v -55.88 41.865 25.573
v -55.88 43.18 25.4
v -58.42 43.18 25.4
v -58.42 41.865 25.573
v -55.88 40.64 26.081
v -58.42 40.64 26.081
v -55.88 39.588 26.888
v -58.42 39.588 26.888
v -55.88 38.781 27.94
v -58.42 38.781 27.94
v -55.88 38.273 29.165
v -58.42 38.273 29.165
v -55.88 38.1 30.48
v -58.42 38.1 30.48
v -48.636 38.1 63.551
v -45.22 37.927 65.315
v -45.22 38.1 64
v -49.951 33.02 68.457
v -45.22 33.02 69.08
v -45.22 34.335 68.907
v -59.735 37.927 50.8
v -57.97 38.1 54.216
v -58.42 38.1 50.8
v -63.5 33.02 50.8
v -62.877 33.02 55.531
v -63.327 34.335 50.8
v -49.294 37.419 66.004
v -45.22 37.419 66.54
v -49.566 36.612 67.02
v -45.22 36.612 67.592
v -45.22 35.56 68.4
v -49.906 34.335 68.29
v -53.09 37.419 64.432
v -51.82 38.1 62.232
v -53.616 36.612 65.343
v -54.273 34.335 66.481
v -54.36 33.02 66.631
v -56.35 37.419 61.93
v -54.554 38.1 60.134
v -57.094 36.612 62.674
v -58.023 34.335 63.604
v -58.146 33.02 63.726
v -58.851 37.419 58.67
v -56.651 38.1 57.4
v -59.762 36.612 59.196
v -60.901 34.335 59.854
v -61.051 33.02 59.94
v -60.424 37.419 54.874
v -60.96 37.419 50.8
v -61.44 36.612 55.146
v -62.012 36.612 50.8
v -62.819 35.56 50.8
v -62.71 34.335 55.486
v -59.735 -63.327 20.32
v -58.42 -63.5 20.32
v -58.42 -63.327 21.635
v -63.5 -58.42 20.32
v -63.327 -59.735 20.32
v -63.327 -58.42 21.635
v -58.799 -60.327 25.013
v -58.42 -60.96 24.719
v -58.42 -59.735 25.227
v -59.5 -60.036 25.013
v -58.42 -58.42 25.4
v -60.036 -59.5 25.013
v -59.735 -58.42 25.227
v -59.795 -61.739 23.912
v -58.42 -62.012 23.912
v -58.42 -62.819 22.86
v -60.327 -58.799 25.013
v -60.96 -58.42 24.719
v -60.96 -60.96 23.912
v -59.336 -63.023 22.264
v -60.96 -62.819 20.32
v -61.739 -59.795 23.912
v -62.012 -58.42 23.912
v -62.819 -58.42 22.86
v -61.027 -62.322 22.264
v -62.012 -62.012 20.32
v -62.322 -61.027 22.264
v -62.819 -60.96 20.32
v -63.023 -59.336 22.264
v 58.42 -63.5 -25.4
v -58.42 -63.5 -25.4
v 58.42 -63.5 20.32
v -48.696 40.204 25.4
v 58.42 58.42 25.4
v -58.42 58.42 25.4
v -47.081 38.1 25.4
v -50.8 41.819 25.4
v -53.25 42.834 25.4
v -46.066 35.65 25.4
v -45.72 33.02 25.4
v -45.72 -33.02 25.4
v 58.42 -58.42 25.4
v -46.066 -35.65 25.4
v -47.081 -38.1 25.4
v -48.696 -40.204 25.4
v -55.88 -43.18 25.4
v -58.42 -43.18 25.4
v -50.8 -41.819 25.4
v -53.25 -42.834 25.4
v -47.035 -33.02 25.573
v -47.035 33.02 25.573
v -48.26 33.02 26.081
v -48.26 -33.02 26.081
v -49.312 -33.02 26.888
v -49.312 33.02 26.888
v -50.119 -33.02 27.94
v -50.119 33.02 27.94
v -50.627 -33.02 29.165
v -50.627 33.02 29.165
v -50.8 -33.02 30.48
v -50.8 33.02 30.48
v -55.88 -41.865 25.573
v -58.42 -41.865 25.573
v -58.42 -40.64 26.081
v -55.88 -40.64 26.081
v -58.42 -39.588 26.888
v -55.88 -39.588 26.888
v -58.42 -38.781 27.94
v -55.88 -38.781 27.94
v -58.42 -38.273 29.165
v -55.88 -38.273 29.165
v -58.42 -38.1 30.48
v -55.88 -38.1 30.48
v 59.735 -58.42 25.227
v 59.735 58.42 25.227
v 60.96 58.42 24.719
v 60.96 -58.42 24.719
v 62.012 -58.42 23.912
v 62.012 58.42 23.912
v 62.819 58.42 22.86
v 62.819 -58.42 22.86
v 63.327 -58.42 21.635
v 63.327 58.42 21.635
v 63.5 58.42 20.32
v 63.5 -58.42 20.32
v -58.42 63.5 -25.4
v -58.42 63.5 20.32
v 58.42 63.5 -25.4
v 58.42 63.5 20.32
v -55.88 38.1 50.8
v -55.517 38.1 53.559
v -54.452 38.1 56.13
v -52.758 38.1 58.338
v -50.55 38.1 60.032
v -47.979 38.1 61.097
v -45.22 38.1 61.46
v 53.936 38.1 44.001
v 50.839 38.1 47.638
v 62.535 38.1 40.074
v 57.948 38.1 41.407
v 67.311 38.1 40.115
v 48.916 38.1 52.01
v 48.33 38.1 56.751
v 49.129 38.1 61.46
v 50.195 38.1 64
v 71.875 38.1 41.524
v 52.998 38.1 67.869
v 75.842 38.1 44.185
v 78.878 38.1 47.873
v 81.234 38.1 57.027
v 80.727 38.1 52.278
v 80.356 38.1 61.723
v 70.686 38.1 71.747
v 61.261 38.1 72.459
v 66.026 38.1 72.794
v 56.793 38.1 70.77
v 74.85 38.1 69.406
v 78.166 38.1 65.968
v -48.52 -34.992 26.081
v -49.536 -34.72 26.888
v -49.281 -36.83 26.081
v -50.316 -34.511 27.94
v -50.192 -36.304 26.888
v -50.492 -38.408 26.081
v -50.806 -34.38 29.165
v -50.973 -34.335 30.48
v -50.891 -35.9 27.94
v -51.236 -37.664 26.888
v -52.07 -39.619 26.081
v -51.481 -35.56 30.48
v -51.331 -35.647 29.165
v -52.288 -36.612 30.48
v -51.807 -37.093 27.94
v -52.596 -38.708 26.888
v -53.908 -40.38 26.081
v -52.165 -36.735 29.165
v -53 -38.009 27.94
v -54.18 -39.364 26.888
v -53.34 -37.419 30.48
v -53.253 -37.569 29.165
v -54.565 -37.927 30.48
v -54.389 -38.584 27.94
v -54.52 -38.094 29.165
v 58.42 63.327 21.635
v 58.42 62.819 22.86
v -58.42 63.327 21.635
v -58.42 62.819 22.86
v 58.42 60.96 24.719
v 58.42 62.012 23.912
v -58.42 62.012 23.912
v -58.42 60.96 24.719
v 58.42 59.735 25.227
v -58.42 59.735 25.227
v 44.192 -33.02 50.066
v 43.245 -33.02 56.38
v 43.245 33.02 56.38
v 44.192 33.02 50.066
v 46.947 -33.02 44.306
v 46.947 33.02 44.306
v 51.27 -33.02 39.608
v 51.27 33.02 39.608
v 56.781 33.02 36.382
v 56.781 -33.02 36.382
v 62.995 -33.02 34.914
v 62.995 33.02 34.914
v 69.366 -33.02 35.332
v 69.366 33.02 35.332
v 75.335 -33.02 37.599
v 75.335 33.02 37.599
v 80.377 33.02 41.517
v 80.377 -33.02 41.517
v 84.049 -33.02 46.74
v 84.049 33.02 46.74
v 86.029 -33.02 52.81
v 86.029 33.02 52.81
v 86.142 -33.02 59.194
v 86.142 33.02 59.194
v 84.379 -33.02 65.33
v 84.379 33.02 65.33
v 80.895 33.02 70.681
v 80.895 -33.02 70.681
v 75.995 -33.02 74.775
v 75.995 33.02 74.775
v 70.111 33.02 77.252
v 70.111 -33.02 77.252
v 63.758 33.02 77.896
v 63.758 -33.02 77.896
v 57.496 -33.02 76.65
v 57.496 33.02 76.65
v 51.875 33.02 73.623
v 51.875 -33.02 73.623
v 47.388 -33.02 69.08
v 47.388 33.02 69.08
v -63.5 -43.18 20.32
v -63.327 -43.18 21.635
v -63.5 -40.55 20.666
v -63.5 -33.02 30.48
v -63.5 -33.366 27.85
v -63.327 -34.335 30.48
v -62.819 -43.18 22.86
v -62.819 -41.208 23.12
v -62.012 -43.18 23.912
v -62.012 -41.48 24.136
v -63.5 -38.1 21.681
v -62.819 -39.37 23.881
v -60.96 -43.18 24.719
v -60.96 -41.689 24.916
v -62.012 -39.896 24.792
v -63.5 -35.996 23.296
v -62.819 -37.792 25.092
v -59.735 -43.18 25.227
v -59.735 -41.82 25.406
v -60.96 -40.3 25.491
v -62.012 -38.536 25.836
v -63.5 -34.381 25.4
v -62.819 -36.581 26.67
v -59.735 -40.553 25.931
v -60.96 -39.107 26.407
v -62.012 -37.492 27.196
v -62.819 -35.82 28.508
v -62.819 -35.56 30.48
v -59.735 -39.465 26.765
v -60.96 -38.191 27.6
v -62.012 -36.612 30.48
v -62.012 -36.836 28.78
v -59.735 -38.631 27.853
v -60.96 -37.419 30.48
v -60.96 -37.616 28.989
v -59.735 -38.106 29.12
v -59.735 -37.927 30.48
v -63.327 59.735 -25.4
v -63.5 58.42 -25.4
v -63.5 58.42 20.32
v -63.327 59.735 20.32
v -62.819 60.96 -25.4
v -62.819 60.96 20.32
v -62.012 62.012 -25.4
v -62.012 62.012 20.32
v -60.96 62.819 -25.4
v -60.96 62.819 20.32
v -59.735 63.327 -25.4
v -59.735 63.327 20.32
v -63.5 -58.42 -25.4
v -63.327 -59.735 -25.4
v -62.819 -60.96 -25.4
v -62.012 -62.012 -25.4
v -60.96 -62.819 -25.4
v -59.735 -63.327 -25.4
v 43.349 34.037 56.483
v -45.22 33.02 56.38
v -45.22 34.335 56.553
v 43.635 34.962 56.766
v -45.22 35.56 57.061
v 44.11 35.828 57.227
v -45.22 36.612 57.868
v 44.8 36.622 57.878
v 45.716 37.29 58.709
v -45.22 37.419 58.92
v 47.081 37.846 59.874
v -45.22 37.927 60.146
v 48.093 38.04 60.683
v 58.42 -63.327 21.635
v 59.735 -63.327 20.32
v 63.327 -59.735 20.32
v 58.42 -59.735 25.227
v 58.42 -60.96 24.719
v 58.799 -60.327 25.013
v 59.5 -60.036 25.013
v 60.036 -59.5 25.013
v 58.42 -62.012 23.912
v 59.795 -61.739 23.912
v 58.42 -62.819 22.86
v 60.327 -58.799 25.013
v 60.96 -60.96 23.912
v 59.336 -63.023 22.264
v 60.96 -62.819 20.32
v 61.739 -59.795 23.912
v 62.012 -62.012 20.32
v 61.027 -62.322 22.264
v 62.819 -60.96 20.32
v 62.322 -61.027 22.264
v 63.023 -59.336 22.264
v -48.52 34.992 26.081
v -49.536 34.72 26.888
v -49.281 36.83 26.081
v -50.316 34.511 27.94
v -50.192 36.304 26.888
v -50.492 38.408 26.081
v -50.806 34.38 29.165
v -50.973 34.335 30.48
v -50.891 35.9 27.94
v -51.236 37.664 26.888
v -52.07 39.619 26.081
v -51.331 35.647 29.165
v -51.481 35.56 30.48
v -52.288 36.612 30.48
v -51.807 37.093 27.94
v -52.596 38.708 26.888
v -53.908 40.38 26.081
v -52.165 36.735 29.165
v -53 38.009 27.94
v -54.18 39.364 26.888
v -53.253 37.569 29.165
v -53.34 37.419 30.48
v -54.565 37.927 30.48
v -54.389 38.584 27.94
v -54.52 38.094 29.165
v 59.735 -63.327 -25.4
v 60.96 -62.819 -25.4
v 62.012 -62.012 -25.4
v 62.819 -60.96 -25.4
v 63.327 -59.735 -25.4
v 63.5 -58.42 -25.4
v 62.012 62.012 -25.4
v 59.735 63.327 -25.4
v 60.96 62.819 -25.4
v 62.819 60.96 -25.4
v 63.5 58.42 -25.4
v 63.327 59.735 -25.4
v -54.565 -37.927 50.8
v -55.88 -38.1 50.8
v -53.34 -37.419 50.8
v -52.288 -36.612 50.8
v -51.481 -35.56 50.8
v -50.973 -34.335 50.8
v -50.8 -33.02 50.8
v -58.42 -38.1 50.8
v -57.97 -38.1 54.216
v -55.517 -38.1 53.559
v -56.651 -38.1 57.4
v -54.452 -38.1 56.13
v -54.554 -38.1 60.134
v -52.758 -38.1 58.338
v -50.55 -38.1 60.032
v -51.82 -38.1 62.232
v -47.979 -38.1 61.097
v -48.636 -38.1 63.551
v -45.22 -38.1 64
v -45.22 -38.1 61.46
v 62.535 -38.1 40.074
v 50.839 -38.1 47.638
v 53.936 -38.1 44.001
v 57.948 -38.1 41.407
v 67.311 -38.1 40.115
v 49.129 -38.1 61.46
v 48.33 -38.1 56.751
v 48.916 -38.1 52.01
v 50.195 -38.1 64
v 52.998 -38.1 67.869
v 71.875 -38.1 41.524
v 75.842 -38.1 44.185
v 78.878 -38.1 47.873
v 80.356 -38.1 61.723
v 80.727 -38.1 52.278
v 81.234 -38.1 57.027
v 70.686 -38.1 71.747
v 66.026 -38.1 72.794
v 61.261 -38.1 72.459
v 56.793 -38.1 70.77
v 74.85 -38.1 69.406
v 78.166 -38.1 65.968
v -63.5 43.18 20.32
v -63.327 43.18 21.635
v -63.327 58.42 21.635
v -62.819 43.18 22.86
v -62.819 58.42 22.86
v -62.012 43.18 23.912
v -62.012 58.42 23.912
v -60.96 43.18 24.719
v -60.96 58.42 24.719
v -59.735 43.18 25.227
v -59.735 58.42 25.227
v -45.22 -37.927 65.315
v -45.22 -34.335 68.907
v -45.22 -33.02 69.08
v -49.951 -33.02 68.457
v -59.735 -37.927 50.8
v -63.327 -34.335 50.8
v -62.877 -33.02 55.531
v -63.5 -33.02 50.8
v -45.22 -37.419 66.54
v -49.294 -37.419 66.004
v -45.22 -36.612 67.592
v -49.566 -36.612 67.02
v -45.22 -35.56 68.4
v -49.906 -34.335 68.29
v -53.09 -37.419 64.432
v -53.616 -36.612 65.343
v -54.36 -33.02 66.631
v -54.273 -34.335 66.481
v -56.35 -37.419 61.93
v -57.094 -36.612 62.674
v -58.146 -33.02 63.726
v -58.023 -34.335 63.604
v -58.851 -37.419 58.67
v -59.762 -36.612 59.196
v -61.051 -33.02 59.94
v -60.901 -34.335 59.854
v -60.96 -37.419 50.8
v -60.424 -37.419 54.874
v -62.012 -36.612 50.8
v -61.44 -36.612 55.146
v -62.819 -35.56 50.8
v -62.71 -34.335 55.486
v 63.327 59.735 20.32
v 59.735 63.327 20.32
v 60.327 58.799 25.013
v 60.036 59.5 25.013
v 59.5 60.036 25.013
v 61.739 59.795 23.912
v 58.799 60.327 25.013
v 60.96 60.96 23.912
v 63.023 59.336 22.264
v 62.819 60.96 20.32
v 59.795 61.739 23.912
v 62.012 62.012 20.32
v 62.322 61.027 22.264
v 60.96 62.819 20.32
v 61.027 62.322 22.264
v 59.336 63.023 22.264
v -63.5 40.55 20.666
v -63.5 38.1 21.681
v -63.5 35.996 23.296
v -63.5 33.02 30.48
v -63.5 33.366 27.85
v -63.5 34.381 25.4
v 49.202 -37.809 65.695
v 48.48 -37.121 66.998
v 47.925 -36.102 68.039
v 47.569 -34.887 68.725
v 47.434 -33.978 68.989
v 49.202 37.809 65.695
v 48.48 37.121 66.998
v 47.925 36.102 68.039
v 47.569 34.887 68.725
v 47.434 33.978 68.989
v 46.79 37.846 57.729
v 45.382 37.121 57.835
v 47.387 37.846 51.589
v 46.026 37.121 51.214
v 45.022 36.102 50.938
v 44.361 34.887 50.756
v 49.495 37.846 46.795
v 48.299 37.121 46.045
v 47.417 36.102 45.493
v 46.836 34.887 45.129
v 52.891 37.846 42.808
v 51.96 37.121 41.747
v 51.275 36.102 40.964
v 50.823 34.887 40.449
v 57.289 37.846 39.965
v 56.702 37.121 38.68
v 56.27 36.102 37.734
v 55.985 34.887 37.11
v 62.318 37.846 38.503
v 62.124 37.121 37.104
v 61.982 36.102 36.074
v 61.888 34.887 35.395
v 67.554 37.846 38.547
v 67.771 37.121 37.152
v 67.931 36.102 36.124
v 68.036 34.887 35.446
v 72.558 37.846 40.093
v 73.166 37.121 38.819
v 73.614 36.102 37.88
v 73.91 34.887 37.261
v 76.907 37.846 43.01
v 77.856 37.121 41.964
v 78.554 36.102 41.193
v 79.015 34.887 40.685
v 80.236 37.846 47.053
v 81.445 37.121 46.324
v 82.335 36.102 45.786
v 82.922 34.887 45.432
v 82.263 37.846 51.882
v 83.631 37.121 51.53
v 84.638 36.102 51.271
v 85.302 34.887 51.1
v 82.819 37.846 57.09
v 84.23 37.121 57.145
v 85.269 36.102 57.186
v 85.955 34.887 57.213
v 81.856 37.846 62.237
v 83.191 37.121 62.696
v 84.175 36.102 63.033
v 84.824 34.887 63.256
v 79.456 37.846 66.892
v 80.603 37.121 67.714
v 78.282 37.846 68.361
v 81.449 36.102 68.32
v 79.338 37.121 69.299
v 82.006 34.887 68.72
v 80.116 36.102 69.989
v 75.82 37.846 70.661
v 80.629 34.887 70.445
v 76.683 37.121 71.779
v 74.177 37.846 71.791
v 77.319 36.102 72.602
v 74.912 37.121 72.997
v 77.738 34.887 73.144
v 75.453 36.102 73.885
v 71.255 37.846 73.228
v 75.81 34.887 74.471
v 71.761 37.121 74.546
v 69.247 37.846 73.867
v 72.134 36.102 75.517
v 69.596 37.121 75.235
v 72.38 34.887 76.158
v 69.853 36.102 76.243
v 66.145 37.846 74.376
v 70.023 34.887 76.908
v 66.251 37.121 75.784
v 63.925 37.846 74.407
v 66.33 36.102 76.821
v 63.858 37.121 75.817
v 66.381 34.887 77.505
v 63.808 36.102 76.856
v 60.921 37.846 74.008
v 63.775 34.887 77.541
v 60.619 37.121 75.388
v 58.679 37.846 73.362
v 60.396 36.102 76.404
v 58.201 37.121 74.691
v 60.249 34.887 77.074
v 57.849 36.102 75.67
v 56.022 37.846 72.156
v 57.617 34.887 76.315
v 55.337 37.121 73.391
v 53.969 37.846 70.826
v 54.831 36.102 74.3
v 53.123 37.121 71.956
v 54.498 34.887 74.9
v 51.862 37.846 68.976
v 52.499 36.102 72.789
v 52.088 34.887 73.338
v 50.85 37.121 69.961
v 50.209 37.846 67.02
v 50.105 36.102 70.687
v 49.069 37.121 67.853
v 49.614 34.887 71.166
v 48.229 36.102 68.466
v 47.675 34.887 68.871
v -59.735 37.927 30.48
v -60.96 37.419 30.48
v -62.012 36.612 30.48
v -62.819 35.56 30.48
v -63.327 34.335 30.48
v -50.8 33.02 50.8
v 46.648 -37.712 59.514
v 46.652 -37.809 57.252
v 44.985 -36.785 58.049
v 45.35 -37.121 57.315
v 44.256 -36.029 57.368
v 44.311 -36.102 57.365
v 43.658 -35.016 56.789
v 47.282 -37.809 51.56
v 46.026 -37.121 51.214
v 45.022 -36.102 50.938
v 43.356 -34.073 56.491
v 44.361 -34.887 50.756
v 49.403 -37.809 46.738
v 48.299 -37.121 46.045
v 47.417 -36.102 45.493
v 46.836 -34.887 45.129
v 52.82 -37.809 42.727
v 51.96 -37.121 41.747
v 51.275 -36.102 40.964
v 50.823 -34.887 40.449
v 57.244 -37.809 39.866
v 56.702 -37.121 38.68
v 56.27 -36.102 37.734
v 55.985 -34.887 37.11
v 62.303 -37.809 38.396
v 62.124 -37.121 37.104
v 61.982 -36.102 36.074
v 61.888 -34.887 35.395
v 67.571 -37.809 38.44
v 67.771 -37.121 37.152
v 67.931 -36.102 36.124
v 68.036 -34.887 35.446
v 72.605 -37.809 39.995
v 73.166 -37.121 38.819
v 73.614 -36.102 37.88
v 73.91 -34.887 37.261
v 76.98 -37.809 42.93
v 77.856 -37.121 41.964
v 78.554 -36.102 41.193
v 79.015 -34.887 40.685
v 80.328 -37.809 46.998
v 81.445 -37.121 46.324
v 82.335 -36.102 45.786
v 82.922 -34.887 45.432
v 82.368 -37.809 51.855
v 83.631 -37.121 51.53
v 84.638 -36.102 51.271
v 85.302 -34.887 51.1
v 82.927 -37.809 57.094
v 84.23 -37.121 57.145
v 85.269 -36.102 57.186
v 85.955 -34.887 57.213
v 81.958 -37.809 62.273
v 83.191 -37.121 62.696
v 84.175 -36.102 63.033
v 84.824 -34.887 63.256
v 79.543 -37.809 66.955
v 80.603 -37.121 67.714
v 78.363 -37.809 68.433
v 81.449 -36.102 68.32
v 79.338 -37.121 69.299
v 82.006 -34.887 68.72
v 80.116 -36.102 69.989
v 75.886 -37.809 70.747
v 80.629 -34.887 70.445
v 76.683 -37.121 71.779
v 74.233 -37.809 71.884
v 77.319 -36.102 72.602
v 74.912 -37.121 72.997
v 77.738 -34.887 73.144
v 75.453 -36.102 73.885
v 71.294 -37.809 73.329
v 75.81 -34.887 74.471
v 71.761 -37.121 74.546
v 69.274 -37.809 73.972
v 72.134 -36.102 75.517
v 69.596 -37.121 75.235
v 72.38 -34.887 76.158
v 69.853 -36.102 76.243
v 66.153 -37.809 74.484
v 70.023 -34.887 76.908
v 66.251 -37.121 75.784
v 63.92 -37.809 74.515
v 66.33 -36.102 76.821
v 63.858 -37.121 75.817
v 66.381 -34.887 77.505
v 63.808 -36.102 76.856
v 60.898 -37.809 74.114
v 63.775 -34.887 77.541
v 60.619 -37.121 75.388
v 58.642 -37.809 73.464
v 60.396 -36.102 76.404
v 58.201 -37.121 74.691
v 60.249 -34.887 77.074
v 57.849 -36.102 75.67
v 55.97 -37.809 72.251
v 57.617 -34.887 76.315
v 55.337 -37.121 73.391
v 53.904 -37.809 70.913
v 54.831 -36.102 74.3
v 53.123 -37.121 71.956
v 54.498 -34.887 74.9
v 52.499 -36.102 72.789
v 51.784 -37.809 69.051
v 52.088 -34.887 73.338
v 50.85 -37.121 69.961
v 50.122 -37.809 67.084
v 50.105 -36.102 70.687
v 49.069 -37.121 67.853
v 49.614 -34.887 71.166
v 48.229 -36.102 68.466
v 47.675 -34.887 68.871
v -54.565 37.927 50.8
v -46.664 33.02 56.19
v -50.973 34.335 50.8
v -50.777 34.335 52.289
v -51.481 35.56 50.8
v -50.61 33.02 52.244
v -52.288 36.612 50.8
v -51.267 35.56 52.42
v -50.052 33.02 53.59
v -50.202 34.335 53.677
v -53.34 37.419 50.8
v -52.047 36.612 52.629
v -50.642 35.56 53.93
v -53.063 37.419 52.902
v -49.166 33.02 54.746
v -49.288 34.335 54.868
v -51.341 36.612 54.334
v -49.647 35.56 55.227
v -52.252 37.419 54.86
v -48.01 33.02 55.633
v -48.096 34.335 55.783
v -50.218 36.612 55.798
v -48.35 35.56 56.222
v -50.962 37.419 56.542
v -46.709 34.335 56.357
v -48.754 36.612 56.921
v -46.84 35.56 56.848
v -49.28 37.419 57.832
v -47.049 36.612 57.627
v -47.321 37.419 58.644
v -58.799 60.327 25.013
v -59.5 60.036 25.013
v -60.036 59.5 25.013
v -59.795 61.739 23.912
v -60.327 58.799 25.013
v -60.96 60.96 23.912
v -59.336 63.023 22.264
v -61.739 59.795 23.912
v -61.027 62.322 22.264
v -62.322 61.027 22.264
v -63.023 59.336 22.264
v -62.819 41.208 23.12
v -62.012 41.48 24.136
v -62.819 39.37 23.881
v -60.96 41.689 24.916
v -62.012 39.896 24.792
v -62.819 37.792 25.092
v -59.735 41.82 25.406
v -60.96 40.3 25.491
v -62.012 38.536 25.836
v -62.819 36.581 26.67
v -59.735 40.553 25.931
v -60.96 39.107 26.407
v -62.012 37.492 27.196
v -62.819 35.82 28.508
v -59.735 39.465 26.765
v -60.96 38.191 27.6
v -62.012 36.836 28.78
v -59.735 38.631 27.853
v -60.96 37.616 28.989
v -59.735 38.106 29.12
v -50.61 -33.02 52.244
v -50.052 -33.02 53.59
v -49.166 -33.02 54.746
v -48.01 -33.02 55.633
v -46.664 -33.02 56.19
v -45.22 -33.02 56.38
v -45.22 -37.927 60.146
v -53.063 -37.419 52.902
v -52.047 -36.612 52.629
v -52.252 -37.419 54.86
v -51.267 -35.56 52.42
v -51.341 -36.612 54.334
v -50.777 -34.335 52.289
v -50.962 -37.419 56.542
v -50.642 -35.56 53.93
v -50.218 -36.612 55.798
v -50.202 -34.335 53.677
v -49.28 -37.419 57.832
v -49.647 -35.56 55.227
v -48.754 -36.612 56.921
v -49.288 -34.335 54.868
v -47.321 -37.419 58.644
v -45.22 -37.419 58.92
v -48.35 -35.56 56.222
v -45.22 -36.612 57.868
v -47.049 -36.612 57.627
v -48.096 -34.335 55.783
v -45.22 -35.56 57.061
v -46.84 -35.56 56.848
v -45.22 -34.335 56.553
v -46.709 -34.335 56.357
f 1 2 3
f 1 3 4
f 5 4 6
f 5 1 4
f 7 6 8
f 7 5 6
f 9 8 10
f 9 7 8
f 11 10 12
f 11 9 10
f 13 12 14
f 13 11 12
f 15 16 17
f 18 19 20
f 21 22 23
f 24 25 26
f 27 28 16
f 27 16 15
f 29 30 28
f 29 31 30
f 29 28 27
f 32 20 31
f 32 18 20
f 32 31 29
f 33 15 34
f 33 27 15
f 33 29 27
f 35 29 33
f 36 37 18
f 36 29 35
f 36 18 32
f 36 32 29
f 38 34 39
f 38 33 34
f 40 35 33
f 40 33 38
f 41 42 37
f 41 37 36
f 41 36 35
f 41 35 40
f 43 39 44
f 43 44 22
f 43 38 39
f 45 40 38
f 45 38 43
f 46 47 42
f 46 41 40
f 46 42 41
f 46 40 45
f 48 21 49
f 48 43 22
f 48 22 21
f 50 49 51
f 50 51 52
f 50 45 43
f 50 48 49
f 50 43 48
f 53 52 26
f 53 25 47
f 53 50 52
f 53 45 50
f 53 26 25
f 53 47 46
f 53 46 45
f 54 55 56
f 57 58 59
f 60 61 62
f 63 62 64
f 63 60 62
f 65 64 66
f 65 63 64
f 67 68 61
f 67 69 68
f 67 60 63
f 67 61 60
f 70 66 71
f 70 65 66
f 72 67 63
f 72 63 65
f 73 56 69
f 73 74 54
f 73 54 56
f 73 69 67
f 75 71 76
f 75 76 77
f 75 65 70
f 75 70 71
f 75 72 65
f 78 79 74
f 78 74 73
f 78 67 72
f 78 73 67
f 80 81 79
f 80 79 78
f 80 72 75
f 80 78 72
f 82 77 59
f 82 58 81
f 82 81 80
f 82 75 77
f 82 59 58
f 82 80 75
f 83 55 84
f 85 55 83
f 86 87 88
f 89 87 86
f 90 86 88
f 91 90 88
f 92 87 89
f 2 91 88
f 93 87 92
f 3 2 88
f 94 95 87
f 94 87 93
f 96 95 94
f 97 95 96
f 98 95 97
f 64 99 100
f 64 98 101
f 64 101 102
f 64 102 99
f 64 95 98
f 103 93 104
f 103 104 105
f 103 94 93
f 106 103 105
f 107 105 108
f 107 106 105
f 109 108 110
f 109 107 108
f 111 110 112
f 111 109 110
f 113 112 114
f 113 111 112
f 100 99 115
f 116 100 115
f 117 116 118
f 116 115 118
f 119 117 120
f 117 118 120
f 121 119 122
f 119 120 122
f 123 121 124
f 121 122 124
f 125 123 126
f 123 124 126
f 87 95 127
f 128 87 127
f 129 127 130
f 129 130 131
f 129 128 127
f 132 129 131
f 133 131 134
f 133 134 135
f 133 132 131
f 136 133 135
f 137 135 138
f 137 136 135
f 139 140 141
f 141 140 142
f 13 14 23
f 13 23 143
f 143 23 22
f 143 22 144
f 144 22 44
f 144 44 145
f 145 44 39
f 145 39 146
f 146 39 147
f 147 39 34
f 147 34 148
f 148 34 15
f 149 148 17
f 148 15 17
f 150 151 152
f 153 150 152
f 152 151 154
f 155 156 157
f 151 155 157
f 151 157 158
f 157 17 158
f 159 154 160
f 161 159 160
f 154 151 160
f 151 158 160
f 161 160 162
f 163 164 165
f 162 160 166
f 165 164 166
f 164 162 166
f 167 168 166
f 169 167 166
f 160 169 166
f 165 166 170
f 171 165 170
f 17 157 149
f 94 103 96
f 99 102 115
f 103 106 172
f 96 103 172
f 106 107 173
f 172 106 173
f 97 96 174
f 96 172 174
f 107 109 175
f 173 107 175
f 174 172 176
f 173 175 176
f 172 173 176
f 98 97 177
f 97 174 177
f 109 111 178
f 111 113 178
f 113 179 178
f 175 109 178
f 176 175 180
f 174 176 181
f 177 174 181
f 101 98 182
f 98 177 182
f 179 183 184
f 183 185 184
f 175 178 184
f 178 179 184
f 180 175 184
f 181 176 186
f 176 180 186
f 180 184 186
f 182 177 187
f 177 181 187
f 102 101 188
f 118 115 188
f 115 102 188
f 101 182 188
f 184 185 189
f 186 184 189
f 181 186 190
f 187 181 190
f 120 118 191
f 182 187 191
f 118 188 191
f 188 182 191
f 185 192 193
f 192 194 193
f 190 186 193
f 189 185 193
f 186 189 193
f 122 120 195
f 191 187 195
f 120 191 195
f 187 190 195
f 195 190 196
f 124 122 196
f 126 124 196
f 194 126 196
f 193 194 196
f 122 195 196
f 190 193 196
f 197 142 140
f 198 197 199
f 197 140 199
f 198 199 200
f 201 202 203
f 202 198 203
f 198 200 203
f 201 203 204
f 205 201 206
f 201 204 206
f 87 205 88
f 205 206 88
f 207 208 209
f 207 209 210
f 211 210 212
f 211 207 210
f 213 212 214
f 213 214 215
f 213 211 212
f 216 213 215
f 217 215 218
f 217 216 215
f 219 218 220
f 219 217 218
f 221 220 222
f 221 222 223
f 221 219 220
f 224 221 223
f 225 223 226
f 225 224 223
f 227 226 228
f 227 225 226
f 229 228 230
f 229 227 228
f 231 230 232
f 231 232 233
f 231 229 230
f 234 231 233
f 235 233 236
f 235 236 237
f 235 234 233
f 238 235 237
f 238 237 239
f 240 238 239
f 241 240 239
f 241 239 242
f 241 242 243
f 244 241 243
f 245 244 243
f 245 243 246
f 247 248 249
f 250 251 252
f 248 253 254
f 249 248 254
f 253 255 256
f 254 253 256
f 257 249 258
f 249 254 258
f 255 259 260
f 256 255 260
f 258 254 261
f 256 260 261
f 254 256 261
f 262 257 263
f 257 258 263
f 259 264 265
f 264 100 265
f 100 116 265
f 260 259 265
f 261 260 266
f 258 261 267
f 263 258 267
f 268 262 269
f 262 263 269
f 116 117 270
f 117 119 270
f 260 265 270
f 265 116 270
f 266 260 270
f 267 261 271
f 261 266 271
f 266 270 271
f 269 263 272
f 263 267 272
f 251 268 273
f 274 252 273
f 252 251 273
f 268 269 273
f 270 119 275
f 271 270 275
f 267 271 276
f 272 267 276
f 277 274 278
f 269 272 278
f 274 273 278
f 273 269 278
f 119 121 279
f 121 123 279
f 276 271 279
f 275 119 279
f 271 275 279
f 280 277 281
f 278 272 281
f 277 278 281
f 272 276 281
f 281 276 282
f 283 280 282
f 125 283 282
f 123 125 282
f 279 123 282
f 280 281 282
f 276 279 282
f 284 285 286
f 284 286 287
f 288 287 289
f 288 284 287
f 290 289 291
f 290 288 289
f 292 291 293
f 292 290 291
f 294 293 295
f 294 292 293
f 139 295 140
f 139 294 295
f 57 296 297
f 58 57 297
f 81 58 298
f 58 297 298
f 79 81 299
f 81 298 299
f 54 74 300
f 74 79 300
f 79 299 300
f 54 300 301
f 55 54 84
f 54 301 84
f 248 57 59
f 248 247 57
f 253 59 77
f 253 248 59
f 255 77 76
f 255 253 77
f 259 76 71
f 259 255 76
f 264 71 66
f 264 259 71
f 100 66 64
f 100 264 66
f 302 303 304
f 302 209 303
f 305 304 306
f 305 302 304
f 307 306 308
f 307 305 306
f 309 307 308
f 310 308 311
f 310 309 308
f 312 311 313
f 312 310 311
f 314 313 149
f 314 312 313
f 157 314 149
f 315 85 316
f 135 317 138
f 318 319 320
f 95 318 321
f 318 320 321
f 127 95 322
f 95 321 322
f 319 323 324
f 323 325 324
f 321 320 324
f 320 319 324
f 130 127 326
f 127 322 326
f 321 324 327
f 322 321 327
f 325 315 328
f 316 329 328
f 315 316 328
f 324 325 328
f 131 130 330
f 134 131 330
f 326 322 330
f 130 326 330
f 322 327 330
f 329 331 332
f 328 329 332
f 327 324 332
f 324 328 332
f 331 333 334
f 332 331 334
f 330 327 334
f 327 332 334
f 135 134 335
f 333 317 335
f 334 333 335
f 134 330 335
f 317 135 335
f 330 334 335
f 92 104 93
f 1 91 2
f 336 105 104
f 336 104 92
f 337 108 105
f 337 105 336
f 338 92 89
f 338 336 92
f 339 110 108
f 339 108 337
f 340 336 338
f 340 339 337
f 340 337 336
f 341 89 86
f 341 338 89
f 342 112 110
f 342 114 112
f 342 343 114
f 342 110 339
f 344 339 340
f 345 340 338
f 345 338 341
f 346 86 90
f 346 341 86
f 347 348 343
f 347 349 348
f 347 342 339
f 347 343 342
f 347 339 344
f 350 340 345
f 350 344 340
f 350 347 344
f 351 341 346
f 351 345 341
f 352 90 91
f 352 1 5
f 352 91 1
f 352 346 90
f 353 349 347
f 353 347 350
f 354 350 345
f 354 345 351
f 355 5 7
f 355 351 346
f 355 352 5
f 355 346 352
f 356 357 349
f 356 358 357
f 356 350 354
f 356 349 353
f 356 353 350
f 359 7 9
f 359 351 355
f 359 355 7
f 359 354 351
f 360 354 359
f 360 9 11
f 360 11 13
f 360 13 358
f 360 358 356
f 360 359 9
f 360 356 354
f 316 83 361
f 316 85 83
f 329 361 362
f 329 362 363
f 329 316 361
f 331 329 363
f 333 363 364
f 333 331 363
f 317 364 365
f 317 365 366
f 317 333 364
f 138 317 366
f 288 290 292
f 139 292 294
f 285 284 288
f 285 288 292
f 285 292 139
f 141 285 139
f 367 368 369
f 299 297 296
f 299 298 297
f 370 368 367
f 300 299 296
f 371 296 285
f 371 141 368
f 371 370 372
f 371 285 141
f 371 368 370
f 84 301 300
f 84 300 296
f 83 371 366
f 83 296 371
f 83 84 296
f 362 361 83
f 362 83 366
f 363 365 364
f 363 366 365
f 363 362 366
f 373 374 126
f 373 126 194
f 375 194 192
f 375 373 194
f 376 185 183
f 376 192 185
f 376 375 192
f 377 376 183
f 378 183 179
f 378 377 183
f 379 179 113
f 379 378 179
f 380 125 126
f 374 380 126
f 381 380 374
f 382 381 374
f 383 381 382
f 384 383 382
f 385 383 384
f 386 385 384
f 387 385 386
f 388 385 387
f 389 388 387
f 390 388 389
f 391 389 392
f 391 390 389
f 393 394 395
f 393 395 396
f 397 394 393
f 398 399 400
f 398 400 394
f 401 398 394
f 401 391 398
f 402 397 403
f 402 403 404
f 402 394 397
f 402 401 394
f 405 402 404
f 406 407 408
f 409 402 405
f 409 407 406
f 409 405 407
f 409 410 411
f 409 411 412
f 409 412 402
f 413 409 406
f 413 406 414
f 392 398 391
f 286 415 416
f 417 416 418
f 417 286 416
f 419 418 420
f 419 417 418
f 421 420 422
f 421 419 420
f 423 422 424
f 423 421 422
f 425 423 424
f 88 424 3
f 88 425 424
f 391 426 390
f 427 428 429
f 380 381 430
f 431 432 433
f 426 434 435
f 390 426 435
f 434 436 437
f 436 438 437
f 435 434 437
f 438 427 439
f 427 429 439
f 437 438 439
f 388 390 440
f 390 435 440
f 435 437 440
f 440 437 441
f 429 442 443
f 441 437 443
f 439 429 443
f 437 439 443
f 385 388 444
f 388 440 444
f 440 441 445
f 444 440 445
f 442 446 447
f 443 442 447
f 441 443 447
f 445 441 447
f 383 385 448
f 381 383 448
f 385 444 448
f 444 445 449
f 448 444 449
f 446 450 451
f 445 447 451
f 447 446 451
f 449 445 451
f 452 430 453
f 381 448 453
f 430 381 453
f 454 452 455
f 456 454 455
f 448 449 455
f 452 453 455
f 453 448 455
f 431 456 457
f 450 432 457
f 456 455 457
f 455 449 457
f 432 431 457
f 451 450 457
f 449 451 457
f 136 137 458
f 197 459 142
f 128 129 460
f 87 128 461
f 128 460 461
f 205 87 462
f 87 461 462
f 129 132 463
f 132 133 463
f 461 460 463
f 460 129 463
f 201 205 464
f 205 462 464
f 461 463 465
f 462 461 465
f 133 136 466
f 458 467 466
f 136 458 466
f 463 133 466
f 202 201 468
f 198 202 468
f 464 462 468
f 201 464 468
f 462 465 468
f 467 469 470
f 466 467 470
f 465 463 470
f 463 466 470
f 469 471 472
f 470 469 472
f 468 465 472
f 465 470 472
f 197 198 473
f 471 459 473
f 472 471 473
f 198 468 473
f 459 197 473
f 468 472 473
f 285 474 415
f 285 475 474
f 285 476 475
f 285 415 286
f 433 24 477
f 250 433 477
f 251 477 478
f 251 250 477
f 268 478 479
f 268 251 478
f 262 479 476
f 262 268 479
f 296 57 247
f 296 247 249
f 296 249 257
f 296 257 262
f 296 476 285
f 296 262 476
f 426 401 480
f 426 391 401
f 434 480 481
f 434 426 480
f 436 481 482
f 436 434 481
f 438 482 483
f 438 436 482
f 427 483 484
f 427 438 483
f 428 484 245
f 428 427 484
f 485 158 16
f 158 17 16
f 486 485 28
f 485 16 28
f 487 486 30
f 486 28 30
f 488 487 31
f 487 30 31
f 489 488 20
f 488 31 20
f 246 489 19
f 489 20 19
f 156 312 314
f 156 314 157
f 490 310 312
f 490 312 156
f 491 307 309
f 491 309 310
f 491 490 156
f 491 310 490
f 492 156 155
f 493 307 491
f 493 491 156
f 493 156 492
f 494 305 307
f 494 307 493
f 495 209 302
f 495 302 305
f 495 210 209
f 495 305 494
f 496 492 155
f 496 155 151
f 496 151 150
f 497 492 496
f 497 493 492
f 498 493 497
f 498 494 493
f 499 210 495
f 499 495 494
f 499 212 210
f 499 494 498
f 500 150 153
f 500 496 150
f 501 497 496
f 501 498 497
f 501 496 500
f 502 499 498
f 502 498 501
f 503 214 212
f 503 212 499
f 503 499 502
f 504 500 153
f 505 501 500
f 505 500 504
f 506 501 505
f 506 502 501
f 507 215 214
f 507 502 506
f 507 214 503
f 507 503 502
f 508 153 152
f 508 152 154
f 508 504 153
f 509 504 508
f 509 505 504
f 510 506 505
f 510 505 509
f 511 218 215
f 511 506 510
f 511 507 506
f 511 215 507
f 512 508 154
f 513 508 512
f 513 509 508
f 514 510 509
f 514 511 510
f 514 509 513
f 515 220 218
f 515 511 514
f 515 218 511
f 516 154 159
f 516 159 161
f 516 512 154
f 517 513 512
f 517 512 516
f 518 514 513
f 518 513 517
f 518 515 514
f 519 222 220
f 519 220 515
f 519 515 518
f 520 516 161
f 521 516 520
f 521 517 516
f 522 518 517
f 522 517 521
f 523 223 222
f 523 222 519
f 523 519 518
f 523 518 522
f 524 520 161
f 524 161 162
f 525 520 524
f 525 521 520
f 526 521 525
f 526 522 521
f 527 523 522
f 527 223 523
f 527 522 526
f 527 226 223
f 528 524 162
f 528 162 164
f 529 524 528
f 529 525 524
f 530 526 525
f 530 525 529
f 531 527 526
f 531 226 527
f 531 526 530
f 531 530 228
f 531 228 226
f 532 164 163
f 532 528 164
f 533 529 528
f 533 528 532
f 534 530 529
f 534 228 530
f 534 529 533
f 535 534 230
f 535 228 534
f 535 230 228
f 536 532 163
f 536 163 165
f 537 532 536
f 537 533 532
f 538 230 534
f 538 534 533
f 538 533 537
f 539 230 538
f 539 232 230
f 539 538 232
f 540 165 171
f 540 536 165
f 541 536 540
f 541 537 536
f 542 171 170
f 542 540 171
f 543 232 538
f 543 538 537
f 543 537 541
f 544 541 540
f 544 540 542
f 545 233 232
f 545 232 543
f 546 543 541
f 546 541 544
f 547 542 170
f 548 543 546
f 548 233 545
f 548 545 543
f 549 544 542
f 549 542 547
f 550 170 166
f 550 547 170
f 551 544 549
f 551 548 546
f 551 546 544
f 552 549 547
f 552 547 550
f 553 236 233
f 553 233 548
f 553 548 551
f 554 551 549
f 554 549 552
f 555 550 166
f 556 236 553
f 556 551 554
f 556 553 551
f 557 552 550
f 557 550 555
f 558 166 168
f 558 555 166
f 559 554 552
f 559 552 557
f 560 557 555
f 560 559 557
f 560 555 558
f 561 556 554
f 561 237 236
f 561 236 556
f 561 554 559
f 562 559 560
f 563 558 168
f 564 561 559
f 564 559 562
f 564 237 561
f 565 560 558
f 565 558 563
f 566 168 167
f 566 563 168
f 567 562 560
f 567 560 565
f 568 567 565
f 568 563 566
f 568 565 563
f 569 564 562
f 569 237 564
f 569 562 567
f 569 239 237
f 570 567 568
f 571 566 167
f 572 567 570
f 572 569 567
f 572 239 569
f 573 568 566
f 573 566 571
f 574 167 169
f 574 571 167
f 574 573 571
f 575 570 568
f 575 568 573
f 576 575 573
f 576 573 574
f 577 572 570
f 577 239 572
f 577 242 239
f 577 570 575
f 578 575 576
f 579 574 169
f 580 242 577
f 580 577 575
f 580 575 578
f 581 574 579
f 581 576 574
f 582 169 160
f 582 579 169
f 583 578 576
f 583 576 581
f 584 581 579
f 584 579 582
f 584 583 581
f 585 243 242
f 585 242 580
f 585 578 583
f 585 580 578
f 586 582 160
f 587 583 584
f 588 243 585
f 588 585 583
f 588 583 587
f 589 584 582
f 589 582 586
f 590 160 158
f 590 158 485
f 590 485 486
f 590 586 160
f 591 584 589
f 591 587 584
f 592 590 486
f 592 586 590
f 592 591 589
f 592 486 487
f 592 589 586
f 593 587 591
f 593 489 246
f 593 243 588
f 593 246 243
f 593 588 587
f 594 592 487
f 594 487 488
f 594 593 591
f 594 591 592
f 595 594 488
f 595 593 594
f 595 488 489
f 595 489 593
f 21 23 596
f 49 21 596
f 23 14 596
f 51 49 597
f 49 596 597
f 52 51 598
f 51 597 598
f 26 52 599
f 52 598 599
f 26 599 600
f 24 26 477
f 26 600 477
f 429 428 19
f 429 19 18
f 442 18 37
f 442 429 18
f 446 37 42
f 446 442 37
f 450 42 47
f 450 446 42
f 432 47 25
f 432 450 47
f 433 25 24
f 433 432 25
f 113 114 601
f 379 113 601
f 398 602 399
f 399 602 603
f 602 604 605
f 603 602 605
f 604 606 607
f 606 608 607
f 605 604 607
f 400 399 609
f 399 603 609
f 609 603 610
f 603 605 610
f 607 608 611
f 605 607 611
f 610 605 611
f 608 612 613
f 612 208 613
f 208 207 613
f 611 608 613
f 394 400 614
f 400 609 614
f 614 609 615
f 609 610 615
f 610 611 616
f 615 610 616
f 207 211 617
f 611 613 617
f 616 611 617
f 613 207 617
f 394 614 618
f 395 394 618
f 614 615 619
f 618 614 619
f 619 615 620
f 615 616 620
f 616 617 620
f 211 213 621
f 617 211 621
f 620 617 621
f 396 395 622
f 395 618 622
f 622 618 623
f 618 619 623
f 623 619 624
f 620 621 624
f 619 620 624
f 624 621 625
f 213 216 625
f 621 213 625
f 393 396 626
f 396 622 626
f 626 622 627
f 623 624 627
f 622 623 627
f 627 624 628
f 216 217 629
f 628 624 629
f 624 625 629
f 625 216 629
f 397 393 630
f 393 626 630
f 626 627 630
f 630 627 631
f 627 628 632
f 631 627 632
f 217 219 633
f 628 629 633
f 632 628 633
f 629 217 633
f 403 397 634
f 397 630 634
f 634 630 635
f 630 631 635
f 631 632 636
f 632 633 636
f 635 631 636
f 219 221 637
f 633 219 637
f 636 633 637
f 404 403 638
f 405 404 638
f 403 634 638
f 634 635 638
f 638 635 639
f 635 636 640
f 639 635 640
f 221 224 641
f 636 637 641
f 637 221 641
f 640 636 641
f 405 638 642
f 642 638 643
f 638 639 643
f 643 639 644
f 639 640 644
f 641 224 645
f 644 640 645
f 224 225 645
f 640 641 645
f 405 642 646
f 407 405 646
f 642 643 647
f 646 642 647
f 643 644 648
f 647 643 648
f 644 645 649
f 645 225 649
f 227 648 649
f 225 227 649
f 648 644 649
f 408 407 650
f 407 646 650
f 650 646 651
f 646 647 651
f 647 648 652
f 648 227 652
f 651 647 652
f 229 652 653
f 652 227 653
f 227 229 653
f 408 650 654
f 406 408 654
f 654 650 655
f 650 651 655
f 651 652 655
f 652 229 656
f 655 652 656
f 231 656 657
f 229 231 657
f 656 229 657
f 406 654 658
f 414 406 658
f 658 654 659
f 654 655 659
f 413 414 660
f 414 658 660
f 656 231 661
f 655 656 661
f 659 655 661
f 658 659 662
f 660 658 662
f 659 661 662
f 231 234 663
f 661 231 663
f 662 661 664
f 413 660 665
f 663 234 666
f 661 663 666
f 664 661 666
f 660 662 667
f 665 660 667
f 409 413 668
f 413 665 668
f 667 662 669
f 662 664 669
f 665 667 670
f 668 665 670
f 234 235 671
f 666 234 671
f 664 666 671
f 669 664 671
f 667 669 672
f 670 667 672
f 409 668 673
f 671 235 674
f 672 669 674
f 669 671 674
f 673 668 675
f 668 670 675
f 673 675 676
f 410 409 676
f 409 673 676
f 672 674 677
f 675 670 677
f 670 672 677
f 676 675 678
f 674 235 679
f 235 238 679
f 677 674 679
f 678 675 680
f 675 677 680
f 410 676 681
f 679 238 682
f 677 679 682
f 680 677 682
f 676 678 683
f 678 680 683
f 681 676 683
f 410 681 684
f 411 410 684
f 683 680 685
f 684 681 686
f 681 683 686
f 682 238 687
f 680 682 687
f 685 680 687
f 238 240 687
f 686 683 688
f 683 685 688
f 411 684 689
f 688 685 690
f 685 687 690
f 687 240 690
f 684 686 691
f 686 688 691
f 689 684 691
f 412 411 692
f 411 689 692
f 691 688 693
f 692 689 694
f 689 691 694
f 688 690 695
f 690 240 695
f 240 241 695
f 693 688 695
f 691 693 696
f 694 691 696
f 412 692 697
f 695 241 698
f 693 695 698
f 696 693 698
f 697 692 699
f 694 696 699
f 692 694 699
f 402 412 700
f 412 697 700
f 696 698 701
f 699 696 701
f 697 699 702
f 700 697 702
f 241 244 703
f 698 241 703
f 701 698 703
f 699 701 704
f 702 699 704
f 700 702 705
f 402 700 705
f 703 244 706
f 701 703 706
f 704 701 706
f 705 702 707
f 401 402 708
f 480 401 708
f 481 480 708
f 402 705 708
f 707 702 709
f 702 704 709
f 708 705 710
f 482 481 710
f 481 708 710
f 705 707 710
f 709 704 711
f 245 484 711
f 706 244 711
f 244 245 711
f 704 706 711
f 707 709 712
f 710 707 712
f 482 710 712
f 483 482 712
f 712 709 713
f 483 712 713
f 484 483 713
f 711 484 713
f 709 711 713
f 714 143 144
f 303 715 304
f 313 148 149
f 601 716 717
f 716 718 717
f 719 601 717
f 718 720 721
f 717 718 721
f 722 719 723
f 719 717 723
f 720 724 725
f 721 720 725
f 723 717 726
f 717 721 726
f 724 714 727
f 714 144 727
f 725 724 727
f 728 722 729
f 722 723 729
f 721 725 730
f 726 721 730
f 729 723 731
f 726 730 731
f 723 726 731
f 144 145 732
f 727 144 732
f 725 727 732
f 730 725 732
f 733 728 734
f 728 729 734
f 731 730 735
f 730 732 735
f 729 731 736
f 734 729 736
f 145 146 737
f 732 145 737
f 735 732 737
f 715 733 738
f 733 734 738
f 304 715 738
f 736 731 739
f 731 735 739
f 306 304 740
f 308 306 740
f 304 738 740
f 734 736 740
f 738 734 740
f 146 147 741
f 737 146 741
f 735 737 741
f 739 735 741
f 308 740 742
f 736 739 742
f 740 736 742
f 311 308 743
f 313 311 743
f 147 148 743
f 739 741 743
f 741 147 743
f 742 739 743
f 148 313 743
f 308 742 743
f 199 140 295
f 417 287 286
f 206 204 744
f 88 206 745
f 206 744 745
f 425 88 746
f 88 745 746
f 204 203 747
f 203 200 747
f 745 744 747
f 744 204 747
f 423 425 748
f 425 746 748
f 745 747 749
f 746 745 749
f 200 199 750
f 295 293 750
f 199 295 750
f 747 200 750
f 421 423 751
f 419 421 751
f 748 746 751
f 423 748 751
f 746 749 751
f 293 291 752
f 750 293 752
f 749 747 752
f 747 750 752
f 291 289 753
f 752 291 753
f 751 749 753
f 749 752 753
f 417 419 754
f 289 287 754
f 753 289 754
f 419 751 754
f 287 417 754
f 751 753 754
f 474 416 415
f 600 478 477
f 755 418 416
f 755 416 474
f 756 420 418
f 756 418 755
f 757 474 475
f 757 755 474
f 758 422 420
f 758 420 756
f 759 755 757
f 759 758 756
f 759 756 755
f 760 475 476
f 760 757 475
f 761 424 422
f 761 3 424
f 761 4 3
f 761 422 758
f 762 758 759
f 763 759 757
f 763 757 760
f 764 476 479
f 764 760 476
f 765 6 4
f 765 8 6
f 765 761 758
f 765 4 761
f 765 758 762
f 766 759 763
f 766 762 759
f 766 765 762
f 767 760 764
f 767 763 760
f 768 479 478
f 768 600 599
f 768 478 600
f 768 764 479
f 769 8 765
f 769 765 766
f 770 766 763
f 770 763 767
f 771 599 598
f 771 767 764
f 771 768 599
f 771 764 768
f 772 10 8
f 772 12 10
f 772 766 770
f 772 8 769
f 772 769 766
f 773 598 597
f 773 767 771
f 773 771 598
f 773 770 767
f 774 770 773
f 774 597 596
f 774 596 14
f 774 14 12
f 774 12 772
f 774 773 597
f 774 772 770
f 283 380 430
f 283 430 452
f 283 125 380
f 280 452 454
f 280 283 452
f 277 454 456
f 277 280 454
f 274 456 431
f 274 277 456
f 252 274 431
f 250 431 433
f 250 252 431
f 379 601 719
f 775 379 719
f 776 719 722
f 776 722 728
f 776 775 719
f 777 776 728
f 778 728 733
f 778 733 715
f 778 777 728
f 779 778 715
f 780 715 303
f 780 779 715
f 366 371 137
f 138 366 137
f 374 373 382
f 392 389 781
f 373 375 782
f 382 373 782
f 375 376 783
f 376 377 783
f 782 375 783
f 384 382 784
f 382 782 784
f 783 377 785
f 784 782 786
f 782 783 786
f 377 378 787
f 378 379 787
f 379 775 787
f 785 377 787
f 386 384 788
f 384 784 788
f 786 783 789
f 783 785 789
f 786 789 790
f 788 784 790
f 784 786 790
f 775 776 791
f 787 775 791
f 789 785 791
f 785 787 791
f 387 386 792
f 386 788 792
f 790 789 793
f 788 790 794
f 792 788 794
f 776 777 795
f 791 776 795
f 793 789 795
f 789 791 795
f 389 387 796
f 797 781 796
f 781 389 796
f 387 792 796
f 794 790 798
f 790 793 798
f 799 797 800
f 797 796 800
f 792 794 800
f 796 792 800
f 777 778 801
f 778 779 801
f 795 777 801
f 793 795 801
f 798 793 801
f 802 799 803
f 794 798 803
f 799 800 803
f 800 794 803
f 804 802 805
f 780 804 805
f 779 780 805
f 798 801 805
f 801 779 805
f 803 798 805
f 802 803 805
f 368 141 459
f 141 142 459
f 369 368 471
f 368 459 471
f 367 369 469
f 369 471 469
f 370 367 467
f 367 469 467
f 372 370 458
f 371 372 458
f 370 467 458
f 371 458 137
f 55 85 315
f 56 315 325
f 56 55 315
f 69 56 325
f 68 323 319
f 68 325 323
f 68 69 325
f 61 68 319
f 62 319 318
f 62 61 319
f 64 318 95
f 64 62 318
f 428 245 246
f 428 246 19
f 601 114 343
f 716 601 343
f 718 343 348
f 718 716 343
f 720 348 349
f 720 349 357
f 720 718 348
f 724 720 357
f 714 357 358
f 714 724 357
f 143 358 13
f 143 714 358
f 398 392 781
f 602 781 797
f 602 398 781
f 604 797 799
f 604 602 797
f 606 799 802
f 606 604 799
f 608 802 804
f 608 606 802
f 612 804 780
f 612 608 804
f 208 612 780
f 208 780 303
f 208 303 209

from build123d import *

# Parameters (mm, degrees)
F1_DEPTH = 63.5
F2_DEPTH = 38.1
F3_R     = 5.08


with BuildPart() as f1:
    # F0 (on Front) → F1 (new body, symmetric)
    with BuildSketch(Plane.XZ):
        Polygon((-63.5, 25.4), (-63.5, -25.4), (63.5, -25.4), (63.5, 25.4), (-50.8, 25.4), align=None)
    extrude(amount=F1_DEPTH, both=True)

    # F0 (on Front) → F2 (join, symmetric)
    with BuildSketch(Plane.XZ):
        with BuildLine():
            Line((-63.5, 50.8), (-63.5, 25.4))
            Line((-63.5, 25.4), (-50.8, 25.4))
            Line((-50.8, 25.4), (-50.8, 50.8))
            ThreePointArc((-50.8, 50.8), (-49.1655663717, 54.7458718322), (-45.2196945395, 56.3803054605))
            Line((-45.2196945395, 56.3803054605), (43.2454477532, 56.3803054605))
            ThreePointArc((43.2454477532, 56.3803054605), (44.3071420431, 63.0595111043), (47.3875670326, 69.0803054605))
            Line((47.3875670326, 69.0803054605), (-45.2196945395, 69.0803054605))
            ThreePointArc((-45.2196945395, 69.0803054605), (-58.1458224928, 63.7261279533), (-63.5, 50.8))
        make_face()
        with BuildLine():
            Line((64.7860094905, 69.0803054605), (47.3875670326, 69.0803054605))
            ThreePointArc((47.3875670326, 69.0803054605), (44.3071420431, 63.0595111043), (43.2454477532, 56.3803054605))
            Line((43.2454477532, 56.3803054605), (64.7860094905, 56.3803054605))
            Line((64.7860094905, 56.3803054605), (64.7860094905, 69.0803054605))
        make_face()
        with BuildLine():
            ThreePointArc((86.3265712278, 56.3803054605), (71.4652151342, 76.8591729079), (47.3875670326, 69.0803054605))
            Line((47.3875670326, 69.0803054605), (64.7860094905, 69.0803054605))
            Line((64.7860094905, 69.0803054605), (64.7860094905, 56.3803054605))
            Line((64.7860094905, 56.3803054605), (43.2454477532, 56.3803054605))
            ThreePointArc((43.2454477532, 56.3803054605), (64.7860094905, 34.8397437232), (86.3265712278, 56.3803054605))
        make_face()
    extrude(amount=F2_DEPTH, both=True)

    # F3
    f3_edges = [f1.edges().sort_by_distance(p)[0] for p in [
        (63.5, -63.5, 0),
        (-63.5, -63.5, 0),
        (63.5, 63.5, 0),
        (-63.5, 63.5, 0),
        (-58.145822, -38.1, 63.726128),
        (-63.5, -38.1, 38.1),
        (-57.15, -38.1, 25.4),
        (-50.8, -38.1, 38.1),
        (-49.165566, -38.1, 54.745872),
        (-0.987123, -38.1, 56.380305),
        (85.264877, -38.1, 49.7011),
        (1.083936, -38.1, 69.080305),
        (-58.145822, 38.1, 63.726128),
        (-63.5, 38.1, 38.1),
        (-57.15, 38.1, 25.4),
        (-50.8, 38.1, 38.1),
        (-49.165566, 38.1, 54.745872),
        (-0.987123, 38.1, 56.380305),
        (85.264877, 38.1, 49.7011),
        (1.083936, 38.1, 69.080305),
        (0, -63.5, 25.4),
        (63.5, 0, 25.4),
        (0, 63.5, 25.4),
        (-63.5, -50.8, 25.4),
        (-63.5, 50.8, 25.4),
        (-50.8, 0, 25.4),
    ]]
    fillet(f3_edges, radius=F3_R)


solid = f1.part
